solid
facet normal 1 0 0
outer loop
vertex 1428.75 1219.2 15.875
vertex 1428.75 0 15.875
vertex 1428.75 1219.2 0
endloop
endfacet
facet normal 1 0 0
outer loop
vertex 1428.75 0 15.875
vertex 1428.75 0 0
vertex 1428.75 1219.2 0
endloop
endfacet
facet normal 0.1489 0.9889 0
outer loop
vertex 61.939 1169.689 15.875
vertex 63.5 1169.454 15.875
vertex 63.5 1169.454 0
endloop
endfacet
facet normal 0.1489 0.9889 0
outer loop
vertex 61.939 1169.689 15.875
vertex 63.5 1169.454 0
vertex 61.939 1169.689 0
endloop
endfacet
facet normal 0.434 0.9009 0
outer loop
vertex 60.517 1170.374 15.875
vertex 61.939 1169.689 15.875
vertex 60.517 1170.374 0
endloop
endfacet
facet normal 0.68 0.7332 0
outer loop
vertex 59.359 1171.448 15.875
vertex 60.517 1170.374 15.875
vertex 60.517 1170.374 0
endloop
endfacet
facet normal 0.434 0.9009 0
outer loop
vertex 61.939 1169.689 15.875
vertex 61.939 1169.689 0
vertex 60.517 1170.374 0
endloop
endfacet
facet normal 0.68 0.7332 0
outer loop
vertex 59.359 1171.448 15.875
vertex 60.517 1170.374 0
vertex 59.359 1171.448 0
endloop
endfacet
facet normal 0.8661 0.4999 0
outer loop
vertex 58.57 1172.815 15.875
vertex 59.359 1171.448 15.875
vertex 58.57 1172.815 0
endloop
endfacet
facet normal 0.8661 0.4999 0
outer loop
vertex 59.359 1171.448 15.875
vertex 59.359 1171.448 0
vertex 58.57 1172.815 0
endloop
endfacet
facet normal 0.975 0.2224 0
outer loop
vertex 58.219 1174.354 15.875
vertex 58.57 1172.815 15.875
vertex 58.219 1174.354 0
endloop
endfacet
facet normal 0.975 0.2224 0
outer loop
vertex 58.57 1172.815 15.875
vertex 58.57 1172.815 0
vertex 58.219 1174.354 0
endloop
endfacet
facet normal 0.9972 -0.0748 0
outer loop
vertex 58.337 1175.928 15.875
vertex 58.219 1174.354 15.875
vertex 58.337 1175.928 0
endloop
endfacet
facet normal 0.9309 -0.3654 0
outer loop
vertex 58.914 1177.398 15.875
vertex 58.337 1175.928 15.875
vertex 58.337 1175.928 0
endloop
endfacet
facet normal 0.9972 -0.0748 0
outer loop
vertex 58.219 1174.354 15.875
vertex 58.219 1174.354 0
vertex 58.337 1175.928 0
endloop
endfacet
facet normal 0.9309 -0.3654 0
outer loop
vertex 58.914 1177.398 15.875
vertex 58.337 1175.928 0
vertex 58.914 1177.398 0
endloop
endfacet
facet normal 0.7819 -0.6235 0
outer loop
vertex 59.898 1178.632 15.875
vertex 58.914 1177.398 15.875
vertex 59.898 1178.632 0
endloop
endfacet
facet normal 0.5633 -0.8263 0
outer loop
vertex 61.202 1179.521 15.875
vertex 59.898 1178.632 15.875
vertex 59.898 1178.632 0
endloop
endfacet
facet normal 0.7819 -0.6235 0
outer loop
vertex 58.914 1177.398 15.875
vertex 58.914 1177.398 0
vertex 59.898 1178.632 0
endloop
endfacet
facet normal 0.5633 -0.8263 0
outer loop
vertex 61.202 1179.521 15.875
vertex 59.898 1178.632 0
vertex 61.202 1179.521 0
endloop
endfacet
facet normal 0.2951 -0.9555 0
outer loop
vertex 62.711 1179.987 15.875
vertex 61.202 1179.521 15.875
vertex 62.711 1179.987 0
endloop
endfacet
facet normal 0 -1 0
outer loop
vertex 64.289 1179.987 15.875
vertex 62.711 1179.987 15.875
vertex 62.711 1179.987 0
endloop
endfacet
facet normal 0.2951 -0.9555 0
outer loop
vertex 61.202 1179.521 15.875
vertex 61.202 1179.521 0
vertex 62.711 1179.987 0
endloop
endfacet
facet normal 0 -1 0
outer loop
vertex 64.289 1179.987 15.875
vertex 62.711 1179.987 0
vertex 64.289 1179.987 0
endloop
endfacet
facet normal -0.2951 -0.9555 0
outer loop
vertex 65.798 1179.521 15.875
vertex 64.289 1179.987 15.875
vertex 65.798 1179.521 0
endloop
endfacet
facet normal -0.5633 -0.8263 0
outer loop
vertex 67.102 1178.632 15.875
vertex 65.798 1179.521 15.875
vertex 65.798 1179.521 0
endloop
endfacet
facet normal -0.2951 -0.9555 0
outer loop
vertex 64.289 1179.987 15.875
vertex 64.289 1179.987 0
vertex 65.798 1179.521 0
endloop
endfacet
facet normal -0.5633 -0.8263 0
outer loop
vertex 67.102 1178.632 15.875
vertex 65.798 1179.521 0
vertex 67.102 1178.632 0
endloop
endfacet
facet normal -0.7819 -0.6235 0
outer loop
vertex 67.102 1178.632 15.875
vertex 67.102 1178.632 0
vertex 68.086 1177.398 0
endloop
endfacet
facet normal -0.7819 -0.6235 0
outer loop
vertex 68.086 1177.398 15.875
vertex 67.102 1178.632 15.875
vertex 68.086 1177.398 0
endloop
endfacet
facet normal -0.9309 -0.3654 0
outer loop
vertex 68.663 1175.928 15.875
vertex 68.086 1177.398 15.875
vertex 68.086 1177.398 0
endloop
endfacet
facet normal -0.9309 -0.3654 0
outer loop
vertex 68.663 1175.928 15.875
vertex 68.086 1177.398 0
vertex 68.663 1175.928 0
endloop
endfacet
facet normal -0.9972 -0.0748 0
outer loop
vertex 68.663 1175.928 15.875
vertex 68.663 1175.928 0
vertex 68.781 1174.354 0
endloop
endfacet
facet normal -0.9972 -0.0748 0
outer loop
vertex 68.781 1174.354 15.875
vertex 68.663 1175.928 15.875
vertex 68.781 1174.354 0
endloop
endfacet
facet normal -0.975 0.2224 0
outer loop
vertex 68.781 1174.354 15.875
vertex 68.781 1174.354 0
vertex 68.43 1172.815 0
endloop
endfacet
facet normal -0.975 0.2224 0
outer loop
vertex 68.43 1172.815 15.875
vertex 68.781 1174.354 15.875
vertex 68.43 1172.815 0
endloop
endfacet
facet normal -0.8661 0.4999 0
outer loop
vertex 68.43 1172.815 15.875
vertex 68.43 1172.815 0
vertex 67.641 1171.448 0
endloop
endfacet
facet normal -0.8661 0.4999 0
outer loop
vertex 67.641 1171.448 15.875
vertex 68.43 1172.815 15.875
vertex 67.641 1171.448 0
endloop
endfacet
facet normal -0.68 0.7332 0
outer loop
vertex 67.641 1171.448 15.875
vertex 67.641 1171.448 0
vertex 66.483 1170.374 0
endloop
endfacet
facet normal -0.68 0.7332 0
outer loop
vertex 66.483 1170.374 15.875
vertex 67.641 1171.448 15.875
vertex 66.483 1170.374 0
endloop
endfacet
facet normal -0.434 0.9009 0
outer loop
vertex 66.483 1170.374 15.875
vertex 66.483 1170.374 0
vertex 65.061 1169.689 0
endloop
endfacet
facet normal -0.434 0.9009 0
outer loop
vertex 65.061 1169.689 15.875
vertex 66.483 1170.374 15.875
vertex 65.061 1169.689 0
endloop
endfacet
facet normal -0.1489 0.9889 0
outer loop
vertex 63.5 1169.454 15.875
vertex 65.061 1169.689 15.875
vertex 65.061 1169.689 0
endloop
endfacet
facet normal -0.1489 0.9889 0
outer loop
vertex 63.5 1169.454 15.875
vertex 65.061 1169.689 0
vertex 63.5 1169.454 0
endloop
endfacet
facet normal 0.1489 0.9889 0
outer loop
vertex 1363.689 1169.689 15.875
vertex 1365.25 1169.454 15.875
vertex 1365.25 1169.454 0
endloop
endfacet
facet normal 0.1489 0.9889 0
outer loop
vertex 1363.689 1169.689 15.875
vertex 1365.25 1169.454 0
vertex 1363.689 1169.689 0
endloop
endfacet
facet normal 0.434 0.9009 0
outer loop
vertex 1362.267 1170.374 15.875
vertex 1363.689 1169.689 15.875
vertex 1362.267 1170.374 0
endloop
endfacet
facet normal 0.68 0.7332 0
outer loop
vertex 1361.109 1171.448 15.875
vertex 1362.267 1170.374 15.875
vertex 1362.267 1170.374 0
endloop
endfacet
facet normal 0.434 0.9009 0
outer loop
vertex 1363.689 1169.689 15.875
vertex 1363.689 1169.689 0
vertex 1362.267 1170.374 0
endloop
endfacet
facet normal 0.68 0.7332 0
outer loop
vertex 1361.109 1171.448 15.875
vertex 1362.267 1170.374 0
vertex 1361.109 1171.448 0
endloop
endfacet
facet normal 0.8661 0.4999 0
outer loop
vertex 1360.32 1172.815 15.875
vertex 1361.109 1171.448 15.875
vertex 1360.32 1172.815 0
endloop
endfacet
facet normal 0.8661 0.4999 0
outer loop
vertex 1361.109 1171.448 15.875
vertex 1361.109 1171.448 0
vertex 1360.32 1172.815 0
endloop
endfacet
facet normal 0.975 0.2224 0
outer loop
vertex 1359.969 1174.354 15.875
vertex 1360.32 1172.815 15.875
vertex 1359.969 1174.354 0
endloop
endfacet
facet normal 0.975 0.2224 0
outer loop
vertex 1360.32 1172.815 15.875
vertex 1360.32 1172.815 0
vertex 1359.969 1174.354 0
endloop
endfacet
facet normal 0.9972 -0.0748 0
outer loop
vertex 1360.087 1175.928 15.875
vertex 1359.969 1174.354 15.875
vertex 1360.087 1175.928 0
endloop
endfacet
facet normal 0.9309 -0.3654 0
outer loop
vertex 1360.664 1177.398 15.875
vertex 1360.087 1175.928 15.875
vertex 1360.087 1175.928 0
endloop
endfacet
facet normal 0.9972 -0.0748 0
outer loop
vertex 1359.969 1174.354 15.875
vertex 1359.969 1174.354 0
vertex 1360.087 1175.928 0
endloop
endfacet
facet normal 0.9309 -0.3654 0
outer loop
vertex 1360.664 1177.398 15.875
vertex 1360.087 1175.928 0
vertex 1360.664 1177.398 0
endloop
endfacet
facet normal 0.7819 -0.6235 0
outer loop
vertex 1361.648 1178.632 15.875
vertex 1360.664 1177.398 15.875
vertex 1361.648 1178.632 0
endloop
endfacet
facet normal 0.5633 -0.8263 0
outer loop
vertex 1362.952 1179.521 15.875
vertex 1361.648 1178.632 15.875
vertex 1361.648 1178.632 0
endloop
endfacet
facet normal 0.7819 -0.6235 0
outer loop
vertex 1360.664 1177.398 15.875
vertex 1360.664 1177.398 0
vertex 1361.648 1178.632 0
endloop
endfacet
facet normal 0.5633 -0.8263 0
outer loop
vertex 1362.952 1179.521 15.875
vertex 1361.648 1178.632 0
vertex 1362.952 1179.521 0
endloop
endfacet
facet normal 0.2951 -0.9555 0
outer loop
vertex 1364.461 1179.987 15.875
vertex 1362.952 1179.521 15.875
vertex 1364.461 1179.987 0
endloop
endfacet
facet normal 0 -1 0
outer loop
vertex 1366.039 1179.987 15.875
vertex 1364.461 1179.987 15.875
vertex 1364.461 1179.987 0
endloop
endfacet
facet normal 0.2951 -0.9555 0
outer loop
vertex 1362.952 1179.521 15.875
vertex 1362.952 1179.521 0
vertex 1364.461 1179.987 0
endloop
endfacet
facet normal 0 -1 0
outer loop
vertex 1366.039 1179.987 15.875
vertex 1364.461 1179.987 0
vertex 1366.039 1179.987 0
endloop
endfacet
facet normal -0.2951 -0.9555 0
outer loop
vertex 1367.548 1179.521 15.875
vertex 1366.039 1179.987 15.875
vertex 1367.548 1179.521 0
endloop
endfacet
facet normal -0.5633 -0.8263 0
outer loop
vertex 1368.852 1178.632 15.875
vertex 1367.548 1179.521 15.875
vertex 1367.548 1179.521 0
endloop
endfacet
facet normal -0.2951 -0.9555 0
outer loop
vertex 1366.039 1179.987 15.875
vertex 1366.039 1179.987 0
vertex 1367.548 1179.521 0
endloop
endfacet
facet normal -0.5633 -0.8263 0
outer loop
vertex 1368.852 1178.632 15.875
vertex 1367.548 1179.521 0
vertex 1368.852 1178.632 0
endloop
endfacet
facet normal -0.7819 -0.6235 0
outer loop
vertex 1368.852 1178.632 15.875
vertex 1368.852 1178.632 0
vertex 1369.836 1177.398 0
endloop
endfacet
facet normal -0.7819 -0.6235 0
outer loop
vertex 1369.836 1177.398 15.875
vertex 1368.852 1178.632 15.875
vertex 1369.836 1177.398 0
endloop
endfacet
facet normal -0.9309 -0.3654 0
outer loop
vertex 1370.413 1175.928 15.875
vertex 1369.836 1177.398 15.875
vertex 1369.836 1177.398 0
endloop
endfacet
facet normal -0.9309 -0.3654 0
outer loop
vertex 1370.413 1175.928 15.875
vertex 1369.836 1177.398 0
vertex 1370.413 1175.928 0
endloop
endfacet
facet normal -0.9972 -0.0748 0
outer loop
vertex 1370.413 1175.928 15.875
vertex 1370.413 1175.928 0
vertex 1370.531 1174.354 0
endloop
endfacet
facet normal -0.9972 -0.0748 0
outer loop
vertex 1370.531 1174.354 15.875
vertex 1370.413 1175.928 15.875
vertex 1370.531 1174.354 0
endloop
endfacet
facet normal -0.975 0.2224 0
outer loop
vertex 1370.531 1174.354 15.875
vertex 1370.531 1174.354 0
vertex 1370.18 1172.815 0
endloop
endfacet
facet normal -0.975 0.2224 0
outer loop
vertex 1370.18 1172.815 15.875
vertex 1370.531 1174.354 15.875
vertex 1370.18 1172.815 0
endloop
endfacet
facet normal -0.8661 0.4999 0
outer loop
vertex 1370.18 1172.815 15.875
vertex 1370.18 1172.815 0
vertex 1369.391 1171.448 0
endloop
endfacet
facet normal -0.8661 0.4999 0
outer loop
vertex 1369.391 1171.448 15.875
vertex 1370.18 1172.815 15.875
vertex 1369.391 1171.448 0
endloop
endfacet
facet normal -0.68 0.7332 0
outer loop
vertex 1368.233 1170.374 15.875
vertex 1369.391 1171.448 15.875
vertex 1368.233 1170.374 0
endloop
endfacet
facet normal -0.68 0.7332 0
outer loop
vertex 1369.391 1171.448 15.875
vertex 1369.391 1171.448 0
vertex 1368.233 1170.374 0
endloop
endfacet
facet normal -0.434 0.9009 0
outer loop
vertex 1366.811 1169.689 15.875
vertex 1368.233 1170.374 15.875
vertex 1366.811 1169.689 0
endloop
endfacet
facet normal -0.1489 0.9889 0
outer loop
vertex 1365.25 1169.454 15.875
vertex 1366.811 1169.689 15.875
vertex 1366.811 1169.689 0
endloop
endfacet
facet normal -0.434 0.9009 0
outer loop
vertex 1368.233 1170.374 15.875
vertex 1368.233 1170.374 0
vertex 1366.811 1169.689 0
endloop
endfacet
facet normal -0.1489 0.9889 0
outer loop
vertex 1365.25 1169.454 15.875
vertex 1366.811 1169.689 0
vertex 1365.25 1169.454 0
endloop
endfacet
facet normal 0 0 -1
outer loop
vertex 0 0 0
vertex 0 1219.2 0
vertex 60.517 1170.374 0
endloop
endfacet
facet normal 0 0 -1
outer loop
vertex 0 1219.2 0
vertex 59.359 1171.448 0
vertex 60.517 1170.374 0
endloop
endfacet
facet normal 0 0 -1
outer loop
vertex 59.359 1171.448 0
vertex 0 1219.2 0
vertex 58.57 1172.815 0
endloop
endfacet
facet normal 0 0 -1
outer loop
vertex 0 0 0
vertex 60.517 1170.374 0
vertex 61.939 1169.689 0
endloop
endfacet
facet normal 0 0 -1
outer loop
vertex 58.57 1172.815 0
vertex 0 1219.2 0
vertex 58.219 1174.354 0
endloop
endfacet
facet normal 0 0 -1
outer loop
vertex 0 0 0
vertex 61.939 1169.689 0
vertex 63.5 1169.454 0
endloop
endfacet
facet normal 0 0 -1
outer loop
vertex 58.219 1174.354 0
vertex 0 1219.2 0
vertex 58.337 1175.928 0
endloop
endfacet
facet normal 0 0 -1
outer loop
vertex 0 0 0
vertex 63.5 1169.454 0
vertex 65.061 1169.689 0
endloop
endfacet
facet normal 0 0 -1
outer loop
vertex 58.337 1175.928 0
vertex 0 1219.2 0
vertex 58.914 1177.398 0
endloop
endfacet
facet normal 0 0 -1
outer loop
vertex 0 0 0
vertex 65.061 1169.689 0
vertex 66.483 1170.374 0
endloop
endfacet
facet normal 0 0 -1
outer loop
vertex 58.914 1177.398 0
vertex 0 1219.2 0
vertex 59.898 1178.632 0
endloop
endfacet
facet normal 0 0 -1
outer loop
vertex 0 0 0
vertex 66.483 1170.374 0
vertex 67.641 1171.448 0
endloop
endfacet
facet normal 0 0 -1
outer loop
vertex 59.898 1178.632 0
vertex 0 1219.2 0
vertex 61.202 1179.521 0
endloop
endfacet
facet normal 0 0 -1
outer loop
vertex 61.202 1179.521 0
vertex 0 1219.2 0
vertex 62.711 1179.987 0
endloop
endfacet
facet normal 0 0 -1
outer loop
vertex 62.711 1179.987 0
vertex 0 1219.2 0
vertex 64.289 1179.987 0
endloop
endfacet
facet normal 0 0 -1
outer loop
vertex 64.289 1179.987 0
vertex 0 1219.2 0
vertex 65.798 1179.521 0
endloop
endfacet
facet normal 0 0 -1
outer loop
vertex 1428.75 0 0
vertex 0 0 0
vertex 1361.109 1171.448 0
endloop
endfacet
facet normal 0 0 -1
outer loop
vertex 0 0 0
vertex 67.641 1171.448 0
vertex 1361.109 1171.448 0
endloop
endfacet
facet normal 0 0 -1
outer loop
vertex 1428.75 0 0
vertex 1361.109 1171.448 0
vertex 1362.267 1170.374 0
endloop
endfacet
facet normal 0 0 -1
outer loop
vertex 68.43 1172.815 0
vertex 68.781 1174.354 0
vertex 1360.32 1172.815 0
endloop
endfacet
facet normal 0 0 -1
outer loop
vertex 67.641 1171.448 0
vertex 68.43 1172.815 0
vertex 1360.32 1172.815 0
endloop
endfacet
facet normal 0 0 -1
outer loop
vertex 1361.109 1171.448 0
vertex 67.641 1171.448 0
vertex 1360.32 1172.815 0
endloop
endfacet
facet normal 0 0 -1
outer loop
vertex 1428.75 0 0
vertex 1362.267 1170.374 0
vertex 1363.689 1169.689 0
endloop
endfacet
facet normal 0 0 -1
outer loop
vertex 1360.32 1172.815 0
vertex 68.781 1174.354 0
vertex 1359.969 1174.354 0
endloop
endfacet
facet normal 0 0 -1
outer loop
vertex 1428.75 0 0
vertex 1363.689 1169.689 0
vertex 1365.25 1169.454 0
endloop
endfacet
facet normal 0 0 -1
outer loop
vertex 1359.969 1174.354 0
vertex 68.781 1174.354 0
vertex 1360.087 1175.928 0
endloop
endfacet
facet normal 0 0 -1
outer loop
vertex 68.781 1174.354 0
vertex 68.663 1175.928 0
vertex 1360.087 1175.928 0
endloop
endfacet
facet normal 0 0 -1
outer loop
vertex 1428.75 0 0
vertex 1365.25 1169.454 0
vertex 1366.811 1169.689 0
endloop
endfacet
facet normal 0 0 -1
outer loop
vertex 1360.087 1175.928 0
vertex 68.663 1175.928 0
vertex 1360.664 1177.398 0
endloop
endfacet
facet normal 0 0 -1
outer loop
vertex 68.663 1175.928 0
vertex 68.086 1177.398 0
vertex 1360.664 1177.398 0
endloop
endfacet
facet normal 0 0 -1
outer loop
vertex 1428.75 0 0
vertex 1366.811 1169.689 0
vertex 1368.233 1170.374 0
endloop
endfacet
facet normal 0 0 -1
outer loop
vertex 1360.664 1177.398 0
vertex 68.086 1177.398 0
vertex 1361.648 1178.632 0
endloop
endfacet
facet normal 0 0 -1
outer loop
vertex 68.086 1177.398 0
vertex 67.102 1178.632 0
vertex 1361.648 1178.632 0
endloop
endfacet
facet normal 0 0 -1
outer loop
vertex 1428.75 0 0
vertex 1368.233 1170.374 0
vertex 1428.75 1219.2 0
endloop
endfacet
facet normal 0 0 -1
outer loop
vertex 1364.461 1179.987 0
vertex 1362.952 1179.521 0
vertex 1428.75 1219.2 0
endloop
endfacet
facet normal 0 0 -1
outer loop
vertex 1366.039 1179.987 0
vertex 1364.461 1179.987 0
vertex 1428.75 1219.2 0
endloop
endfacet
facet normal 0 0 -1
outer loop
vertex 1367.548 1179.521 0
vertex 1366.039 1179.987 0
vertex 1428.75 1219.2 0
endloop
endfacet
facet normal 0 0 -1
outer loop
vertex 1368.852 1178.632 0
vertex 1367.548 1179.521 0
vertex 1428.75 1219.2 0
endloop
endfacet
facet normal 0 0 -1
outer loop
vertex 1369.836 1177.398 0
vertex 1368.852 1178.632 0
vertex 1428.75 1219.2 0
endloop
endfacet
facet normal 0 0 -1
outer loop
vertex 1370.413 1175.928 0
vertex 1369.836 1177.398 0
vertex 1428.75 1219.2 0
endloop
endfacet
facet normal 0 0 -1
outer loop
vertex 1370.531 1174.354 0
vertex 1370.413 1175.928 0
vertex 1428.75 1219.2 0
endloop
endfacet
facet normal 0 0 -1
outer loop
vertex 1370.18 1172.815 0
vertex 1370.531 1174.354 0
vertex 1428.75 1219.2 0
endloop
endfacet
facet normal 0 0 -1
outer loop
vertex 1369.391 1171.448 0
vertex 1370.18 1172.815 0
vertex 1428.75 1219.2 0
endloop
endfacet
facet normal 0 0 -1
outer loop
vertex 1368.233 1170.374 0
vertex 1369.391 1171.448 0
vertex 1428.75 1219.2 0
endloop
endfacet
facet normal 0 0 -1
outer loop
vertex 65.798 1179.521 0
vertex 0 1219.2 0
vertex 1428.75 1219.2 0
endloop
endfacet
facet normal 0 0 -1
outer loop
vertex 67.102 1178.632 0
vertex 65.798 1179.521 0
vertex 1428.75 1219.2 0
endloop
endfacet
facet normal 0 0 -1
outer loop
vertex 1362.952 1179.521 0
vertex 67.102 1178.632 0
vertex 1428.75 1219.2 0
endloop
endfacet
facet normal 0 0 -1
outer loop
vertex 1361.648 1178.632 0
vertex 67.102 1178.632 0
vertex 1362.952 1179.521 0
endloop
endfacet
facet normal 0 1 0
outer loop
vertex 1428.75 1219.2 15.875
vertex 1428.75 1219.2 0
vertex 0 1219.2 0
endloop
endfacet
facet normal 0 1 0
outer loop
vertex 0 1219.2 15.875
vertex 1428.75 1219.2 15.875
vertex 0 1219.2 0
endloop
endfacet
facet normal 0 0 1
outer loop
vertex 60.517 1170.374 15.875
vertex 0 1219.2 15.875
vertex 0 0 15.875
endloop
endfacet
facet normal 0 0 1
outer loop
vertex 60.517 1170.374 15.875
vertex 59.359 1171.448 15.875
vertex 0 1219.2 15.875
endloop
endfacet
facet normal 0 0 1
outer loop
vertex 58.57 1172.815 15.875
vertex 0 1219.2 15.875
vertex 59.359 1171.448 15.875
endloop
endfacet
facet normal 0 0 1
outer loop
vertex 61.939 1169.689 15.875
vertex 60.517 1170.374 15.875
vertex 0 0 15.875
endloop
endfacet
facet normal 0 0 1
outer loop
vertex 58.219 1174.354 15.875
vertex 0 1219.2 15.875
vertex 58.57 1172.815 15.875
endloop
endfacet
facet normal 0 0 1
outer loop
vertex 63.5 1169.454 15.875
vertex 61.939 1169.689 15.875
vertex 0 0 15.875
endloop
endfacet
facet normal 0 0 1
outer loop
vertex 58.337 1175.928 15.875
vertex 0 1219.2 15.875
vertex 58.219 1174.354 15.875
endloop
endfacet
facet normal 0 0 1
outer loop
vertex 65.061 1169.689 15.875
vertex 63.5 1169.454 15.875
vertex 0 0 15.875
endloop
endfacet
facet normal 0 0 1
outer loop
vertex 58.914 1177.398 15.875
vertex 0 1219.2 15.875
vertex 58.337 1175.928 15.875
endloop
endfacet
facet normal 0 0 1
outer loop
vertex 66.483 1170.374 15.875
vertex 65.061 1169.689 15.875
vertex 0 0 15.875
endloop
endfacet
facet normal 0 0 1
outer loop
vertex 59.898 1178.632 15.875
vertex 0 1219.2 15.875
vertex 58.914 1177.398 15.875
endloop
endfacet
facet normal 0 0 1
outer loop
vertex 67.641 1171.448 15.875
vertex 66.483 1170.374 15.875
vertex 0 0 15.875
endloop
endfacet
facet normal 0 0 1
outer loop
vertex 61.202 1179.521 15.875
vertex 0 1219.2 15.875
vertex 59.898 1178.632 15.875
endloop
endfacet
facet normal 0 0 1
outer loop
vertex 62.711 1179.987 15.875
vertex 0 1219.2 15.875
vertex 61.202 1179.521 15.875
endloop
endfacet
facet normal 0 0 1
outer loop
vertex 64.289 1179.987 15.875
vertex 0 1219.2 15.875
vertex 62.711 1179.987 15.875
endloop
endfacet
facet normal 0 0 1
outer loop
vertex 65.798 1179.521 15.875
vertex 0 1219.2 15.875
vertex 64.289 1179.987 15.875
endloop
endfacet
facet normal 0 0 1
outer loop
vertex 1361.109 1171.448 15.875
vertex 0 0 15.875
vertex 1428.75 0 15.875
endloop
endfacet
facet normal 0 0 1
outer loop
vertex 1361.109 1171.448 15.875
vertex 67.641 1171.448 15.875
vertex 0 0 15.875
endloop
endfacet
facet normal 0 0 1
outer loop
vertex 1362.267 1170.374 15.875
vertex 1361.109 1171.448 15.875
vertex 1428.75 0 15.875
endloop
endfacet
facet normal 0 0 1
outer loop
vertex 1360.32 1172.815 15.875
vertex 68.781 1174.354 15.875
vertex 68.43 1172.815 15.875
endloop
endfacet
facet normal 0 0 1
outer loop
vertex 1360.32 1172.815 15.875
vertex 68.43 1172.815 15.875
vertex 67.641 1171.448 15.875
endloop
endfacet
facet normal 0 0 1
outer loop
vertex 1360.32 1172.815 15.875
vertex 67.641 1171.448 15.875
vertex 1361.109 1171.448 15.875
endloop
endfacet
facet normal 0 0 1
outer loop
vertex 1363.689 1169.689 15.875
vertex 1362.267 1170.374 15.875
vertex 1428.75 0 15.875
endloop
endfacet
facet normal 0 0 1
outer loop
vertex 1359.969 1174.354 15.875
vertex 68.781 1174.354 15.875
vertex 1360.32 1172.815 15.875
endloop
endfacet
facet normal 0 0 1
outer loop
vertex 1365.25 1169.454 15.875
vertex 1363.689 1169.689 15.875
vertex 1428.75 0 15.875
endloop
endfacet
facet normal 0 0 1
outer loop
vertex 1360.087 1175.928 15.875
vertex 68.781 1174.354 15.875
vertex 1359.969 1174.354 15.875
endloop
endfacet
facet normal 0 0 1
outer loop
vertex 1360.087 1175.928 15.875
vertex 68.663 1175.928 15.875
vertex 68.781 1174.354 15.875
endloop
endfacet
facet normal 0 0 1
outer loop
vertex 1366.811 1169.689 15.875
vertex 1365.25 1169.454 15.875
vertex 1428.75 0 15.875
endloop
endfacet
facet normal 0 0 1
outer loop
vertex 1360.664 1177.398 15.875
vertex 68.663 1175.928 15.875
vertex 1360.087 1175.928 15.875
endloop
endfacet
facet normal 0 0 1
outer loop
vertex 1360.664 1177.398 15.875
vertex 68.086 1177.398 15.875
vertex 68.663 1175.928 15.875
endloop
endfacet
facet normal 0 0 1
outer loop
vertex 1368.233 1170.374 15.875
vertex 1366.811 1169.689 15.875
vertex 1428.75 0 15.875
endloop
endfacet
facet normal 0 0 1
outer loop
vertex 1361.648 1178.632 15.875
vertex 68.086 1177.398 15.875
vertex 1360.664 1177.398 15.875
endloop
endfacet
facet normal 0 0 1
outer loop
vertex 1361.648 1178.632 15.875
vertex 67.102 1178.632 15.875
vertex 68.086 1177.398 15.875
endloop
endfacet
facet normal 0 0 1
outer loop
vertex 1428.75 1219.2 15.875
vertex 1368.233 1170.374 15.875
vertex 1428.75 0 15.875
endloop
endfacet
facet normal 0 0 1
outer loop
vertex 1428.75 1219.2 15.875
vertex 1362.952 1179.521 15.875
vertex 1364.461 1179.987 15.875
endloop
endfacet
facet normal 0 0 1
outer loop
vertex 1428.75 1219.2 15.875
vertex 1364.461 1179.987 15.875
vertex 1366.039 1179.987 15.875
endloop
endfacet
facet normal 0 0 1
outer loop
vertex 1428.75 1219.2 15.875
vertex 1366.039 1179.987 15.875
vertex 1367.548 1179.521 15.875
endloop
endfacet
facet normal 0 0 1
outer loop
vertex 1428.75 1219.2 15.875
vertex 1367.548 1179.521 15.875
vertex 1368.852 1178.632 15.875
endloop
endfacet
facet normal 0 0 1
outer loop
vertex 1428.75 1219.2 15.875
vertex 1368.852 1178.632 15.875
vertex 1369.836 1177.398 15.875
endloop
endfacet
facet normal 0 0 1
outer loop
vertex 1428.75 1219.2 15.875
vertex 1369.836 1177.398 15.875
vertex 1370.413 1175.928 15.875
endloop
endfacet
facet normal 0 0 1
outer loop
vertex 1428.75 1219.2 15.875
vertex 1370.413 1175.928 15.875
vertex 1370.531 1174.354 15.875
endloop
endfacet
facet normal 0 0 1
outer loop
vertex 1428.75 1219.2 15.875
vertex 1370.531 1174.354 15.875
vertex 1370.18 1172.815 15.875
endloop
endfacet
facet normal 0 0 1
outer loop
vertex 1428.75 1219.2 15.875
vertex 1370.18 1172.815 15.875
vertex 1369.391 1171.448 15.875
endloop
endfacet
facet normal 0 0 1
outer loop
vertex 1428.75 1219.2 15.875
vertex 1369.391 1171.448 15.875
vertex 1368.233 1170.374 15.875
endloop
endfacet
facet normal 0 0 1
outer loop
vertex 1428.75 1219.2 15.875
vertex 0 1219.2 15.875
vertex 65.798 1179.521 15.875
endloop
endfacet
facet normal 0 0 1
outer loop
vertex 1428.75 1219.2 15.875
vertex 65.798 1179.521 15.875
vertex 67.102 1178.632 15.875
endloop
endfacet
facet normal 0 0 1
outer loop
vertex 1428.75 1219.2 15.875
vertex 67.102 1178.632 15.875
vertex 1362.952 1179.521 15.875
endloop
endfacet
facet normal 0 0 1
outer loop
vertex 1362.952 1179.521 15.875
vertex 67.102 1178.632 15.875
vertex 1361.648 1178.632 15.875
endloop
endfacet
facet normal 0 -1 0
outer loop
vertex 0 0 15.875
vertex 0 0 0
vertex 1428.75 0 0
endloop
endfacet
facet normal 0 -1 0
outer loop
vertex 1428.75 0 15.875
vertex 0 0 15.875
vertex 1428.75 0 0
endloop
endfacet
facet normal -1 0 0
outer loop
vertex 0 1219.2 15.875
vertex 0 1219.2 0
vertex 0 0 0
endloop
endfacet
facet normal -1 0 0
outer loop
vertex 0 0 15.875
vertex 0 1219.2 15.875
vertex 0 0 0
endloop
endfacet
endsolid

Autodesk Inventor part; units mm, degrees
ref_plane "YZ Plane" through (0, 0, 0) normal (1, 0, 0) x (0, 1, 0)
ref_plane "XZ Plane" through (0, 0, 0) normal (0, 1, 0) x (-1, 0, 0)
ref_plane "XY Plane" through (0, 0, 0) normal (0, 0, 1) x (1, 0, 0)
sketch "Sketch1" plane through (0, 0, 0) normal (0, 0, 1) x (1, 0, 0)
  line L0 (0, 0) -> (1428.75, 0)
  line L1 (1428.75, 0) -> (1428.75, 1219.2)
  line L2 (1428.75, 1219.2) -> (0, 1219.2)
  line L3 (0, 1219.2) -> (0, 0)
  dimension "d0" = 1428.75
  dimension "d1" = 1219.2
extrude "Extrusion1" add sketch "Sketch1" along normal blind 15.875
sketch "Sketch2" plane through (0, 0, 15.875) normal (0, 0, 1) x (1, 0, 0)
  line L0 (1428.75, 1219.2) -> (1365.25, 1219.2)
  line L1 (1365.25, 1219.2) -> (1365.25, 1174.75)
  line L2 (1365.25, 1174.75) -> (1428.75, 1174.75)
  line L3 (1428.75, 1174.75) -> (1428.75, 1219.2)
  line L4 (0, 1219.2) -> (63.5, 1219.2)
  line L5 (63.5, 1219.2) -> (63.5, 1174.75)
  line L6 (63.5, 1174.75) -> (0, 1174.75)
  line L7 (0, 1174.75) -> (0, 1219.2)
  dimension "d4" = 63.5
  dimension "d5" = 44.45
  dimension "d6" = 63.5
hole "Hole1" at (1365.25, 1174.75, 15.875) at (63.5, 1174.75, 15.875) direction (0, 0, -1) diameter 10.5918 depth 35.179 tip angle 118 thread size "1/2-13 UNC" class "2B" standard "ANSI Unified Screw Threads"
properties part number "56.25x48 Gyp Top"
